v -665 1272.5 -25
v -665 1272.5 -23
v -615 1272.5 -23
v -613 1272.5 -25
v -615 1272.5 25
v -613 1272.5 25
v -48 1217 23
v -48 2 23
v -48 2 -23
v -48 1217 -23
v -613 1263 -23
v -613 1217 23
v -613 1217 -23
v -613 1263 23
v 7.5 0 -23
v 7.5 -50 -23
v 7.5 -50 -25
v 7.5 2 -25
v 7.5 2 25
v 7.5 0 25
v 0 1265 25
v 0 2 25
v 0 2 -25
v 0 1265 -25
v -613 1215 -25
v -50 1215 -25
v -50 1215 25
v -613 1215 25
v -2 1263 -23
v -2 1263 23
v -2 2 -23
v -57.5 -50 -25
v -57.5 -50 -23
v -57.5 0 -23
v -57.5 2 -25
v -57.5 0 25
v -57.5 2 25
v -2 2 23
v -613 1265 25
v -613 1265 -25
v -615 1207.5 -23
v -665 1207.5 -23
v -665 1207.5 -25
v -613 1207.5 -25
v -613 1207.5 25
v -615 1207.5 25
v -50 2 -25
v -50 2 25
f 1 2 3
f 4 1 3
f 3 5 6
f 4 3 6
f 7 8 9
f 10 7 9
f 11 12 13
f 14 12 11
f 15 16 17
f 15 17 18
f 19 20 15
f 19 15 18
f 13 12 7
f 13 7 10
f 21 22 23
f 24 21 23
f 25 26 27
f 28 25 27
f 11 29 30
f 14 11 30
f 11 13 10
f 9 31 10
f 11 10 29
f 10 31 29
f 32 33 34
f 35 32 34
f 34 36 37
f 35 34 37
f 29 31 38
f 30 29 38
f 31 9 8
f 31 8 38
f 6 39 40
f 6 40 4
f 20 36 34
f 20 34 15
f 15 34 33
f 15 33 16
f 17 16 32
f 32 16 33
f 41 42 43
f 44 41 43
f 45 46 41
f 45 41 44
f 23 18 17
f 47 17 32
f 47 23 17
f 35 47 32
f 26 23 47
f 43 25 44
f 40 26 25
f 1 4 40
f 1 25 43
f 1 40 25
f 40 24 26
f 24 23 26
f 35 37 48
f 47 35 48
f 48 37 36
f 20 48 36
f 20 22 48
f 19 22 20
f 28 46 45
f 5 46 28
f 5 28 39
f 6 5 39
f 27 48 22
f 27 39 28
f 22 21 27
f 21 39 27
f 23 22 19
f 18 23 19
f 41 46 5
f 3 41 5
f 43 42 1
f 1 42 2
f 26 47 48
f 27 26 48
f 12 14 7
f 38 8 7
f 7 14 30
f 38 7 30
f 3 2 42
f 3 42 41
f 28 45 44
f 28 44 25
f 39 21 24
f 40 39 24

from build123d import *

# Parameters (mm, degrees)
SKETCH2_W           = 50
SKETCH2_H           = 50
SKETCH2_W_2         = 46
SKETCH2_H_2         = 46
SKETCH3_W           = 65
SKETCH3_H           = 50
BOSS_EXTRUDE1_DEPTH = 2
SKETCH4_W           = 50
SKETCH4_H           = 65
BOSS_EXTRUDE2_DEPTH = 2
SKETCH5_W           = 2
SKETCH5_H           = 65
SKETCH5_W_2         = 65
SKETCH5_H_2         = 2
BOSS_EXTRUDE3_DEPTH = 50
SKETCH6_W           = 65
SKETCH6_H           = 50
SKETCH6_W_2         = 50
SKETCH6_H_2         = 65
BOSS_EXTRUDE4_DEPTH = 48
SKETCH7_W           = 50
SKETCH7_H           = 65
SKETCH7_W_2         = 65
SKETCH7_H_2         = 50
CUT_EXTRUDE1_DEPTH  = 48


with BuildPart() as part:
    # Sweep1: sweep along a path in Sketch1
    with BuildLine(Plane.XY) as sweep1_path:
        Line((-615, 1265), (0, 1265))
        Line((0, 1265), (0, 0))
    # Sketch2 → Sweep1 (sweep)
    with BuildSketch(Plane(origin=(0, 0, 0), x_dir=(1, 0, 0), z_dir=(0, 1, 0))):
        with Locations((-25, 0)):
            Rectangle(SKETCH2_W, SKETCH2_H)
        with Locations((-25, 0)):
            Rectangle(SKETCH2_W_2, SKETCH2_H_2, mode=Mode.SUBTRACT)
    sweep(path=sweep1_path.line, transition=Transition.RIGHT)

    # Sketch3 → Boss-Extrude1 (add)
    with BuildSketch(Plane.XY.offset(25)):
        with Locations((-25, -25)):
            Rectangle(SKETCH3_W, SKETCH3_H)
    extrude(amount=-BOSS_EXTRUDE1_DEPTH)

    # Sketch4 → Boss-Extrude2 (add)
    with BuildSketch(Plane.XY.offset(25)):
        with Locations((-640, 1240)):
            Rectangle(SKETCH4_W, SKETCH4_H)
    extrude(amount=-BOSS_EXTRUDE2_DEPTH)

    # Sketch5 → Boss-Extrude3 (add)
    with BuildSketch(Plane.XY.offset(25)):
        with Locations((-614, 1240)):
            Rectangle(SKETCH5_W, SKETCH5_H)
        with Locations((-25, 1)):
            Rectangle(SKETCH5_W_2, SKETCH5_H_2)
    extrude(amount=-BOSS_EXTRUDE3_DEPTH)

    # Sketch6 → Boss-Extrude4 (add)
    with BuildSketch(Plane(origin=(0, 0, 23), x_dir=(-1, 0, 0), z_dir=(0, 0, -1))):
        with Locations((25, -25)):
            Rectangle(SKETCH6_W, SKETCH6_H)
        with Locations((640, 1240)):
            Rectangle(SKETCH6_W_2, SKETCH6_H_2)
    extrude(amount=BOSS_EXTRUDE4_DEPTH)

    # Sketch7 → Cut-Extrude1 (cut)
    with BuildSketch(Plane.XY.offset(25)):
        with Locations((-640, 1240)):
            Rectangle(SKETCH7_W, SKETCH7_H)
        with Locations((-25, -25)):
            Rectangle(SKETCH7_W_2, SKETCH7_H_2)
    extrude(amount=-CUT_EXTRUDE1_DEPTH, mode=Mode.SUBTRACT)


solid = part.part
